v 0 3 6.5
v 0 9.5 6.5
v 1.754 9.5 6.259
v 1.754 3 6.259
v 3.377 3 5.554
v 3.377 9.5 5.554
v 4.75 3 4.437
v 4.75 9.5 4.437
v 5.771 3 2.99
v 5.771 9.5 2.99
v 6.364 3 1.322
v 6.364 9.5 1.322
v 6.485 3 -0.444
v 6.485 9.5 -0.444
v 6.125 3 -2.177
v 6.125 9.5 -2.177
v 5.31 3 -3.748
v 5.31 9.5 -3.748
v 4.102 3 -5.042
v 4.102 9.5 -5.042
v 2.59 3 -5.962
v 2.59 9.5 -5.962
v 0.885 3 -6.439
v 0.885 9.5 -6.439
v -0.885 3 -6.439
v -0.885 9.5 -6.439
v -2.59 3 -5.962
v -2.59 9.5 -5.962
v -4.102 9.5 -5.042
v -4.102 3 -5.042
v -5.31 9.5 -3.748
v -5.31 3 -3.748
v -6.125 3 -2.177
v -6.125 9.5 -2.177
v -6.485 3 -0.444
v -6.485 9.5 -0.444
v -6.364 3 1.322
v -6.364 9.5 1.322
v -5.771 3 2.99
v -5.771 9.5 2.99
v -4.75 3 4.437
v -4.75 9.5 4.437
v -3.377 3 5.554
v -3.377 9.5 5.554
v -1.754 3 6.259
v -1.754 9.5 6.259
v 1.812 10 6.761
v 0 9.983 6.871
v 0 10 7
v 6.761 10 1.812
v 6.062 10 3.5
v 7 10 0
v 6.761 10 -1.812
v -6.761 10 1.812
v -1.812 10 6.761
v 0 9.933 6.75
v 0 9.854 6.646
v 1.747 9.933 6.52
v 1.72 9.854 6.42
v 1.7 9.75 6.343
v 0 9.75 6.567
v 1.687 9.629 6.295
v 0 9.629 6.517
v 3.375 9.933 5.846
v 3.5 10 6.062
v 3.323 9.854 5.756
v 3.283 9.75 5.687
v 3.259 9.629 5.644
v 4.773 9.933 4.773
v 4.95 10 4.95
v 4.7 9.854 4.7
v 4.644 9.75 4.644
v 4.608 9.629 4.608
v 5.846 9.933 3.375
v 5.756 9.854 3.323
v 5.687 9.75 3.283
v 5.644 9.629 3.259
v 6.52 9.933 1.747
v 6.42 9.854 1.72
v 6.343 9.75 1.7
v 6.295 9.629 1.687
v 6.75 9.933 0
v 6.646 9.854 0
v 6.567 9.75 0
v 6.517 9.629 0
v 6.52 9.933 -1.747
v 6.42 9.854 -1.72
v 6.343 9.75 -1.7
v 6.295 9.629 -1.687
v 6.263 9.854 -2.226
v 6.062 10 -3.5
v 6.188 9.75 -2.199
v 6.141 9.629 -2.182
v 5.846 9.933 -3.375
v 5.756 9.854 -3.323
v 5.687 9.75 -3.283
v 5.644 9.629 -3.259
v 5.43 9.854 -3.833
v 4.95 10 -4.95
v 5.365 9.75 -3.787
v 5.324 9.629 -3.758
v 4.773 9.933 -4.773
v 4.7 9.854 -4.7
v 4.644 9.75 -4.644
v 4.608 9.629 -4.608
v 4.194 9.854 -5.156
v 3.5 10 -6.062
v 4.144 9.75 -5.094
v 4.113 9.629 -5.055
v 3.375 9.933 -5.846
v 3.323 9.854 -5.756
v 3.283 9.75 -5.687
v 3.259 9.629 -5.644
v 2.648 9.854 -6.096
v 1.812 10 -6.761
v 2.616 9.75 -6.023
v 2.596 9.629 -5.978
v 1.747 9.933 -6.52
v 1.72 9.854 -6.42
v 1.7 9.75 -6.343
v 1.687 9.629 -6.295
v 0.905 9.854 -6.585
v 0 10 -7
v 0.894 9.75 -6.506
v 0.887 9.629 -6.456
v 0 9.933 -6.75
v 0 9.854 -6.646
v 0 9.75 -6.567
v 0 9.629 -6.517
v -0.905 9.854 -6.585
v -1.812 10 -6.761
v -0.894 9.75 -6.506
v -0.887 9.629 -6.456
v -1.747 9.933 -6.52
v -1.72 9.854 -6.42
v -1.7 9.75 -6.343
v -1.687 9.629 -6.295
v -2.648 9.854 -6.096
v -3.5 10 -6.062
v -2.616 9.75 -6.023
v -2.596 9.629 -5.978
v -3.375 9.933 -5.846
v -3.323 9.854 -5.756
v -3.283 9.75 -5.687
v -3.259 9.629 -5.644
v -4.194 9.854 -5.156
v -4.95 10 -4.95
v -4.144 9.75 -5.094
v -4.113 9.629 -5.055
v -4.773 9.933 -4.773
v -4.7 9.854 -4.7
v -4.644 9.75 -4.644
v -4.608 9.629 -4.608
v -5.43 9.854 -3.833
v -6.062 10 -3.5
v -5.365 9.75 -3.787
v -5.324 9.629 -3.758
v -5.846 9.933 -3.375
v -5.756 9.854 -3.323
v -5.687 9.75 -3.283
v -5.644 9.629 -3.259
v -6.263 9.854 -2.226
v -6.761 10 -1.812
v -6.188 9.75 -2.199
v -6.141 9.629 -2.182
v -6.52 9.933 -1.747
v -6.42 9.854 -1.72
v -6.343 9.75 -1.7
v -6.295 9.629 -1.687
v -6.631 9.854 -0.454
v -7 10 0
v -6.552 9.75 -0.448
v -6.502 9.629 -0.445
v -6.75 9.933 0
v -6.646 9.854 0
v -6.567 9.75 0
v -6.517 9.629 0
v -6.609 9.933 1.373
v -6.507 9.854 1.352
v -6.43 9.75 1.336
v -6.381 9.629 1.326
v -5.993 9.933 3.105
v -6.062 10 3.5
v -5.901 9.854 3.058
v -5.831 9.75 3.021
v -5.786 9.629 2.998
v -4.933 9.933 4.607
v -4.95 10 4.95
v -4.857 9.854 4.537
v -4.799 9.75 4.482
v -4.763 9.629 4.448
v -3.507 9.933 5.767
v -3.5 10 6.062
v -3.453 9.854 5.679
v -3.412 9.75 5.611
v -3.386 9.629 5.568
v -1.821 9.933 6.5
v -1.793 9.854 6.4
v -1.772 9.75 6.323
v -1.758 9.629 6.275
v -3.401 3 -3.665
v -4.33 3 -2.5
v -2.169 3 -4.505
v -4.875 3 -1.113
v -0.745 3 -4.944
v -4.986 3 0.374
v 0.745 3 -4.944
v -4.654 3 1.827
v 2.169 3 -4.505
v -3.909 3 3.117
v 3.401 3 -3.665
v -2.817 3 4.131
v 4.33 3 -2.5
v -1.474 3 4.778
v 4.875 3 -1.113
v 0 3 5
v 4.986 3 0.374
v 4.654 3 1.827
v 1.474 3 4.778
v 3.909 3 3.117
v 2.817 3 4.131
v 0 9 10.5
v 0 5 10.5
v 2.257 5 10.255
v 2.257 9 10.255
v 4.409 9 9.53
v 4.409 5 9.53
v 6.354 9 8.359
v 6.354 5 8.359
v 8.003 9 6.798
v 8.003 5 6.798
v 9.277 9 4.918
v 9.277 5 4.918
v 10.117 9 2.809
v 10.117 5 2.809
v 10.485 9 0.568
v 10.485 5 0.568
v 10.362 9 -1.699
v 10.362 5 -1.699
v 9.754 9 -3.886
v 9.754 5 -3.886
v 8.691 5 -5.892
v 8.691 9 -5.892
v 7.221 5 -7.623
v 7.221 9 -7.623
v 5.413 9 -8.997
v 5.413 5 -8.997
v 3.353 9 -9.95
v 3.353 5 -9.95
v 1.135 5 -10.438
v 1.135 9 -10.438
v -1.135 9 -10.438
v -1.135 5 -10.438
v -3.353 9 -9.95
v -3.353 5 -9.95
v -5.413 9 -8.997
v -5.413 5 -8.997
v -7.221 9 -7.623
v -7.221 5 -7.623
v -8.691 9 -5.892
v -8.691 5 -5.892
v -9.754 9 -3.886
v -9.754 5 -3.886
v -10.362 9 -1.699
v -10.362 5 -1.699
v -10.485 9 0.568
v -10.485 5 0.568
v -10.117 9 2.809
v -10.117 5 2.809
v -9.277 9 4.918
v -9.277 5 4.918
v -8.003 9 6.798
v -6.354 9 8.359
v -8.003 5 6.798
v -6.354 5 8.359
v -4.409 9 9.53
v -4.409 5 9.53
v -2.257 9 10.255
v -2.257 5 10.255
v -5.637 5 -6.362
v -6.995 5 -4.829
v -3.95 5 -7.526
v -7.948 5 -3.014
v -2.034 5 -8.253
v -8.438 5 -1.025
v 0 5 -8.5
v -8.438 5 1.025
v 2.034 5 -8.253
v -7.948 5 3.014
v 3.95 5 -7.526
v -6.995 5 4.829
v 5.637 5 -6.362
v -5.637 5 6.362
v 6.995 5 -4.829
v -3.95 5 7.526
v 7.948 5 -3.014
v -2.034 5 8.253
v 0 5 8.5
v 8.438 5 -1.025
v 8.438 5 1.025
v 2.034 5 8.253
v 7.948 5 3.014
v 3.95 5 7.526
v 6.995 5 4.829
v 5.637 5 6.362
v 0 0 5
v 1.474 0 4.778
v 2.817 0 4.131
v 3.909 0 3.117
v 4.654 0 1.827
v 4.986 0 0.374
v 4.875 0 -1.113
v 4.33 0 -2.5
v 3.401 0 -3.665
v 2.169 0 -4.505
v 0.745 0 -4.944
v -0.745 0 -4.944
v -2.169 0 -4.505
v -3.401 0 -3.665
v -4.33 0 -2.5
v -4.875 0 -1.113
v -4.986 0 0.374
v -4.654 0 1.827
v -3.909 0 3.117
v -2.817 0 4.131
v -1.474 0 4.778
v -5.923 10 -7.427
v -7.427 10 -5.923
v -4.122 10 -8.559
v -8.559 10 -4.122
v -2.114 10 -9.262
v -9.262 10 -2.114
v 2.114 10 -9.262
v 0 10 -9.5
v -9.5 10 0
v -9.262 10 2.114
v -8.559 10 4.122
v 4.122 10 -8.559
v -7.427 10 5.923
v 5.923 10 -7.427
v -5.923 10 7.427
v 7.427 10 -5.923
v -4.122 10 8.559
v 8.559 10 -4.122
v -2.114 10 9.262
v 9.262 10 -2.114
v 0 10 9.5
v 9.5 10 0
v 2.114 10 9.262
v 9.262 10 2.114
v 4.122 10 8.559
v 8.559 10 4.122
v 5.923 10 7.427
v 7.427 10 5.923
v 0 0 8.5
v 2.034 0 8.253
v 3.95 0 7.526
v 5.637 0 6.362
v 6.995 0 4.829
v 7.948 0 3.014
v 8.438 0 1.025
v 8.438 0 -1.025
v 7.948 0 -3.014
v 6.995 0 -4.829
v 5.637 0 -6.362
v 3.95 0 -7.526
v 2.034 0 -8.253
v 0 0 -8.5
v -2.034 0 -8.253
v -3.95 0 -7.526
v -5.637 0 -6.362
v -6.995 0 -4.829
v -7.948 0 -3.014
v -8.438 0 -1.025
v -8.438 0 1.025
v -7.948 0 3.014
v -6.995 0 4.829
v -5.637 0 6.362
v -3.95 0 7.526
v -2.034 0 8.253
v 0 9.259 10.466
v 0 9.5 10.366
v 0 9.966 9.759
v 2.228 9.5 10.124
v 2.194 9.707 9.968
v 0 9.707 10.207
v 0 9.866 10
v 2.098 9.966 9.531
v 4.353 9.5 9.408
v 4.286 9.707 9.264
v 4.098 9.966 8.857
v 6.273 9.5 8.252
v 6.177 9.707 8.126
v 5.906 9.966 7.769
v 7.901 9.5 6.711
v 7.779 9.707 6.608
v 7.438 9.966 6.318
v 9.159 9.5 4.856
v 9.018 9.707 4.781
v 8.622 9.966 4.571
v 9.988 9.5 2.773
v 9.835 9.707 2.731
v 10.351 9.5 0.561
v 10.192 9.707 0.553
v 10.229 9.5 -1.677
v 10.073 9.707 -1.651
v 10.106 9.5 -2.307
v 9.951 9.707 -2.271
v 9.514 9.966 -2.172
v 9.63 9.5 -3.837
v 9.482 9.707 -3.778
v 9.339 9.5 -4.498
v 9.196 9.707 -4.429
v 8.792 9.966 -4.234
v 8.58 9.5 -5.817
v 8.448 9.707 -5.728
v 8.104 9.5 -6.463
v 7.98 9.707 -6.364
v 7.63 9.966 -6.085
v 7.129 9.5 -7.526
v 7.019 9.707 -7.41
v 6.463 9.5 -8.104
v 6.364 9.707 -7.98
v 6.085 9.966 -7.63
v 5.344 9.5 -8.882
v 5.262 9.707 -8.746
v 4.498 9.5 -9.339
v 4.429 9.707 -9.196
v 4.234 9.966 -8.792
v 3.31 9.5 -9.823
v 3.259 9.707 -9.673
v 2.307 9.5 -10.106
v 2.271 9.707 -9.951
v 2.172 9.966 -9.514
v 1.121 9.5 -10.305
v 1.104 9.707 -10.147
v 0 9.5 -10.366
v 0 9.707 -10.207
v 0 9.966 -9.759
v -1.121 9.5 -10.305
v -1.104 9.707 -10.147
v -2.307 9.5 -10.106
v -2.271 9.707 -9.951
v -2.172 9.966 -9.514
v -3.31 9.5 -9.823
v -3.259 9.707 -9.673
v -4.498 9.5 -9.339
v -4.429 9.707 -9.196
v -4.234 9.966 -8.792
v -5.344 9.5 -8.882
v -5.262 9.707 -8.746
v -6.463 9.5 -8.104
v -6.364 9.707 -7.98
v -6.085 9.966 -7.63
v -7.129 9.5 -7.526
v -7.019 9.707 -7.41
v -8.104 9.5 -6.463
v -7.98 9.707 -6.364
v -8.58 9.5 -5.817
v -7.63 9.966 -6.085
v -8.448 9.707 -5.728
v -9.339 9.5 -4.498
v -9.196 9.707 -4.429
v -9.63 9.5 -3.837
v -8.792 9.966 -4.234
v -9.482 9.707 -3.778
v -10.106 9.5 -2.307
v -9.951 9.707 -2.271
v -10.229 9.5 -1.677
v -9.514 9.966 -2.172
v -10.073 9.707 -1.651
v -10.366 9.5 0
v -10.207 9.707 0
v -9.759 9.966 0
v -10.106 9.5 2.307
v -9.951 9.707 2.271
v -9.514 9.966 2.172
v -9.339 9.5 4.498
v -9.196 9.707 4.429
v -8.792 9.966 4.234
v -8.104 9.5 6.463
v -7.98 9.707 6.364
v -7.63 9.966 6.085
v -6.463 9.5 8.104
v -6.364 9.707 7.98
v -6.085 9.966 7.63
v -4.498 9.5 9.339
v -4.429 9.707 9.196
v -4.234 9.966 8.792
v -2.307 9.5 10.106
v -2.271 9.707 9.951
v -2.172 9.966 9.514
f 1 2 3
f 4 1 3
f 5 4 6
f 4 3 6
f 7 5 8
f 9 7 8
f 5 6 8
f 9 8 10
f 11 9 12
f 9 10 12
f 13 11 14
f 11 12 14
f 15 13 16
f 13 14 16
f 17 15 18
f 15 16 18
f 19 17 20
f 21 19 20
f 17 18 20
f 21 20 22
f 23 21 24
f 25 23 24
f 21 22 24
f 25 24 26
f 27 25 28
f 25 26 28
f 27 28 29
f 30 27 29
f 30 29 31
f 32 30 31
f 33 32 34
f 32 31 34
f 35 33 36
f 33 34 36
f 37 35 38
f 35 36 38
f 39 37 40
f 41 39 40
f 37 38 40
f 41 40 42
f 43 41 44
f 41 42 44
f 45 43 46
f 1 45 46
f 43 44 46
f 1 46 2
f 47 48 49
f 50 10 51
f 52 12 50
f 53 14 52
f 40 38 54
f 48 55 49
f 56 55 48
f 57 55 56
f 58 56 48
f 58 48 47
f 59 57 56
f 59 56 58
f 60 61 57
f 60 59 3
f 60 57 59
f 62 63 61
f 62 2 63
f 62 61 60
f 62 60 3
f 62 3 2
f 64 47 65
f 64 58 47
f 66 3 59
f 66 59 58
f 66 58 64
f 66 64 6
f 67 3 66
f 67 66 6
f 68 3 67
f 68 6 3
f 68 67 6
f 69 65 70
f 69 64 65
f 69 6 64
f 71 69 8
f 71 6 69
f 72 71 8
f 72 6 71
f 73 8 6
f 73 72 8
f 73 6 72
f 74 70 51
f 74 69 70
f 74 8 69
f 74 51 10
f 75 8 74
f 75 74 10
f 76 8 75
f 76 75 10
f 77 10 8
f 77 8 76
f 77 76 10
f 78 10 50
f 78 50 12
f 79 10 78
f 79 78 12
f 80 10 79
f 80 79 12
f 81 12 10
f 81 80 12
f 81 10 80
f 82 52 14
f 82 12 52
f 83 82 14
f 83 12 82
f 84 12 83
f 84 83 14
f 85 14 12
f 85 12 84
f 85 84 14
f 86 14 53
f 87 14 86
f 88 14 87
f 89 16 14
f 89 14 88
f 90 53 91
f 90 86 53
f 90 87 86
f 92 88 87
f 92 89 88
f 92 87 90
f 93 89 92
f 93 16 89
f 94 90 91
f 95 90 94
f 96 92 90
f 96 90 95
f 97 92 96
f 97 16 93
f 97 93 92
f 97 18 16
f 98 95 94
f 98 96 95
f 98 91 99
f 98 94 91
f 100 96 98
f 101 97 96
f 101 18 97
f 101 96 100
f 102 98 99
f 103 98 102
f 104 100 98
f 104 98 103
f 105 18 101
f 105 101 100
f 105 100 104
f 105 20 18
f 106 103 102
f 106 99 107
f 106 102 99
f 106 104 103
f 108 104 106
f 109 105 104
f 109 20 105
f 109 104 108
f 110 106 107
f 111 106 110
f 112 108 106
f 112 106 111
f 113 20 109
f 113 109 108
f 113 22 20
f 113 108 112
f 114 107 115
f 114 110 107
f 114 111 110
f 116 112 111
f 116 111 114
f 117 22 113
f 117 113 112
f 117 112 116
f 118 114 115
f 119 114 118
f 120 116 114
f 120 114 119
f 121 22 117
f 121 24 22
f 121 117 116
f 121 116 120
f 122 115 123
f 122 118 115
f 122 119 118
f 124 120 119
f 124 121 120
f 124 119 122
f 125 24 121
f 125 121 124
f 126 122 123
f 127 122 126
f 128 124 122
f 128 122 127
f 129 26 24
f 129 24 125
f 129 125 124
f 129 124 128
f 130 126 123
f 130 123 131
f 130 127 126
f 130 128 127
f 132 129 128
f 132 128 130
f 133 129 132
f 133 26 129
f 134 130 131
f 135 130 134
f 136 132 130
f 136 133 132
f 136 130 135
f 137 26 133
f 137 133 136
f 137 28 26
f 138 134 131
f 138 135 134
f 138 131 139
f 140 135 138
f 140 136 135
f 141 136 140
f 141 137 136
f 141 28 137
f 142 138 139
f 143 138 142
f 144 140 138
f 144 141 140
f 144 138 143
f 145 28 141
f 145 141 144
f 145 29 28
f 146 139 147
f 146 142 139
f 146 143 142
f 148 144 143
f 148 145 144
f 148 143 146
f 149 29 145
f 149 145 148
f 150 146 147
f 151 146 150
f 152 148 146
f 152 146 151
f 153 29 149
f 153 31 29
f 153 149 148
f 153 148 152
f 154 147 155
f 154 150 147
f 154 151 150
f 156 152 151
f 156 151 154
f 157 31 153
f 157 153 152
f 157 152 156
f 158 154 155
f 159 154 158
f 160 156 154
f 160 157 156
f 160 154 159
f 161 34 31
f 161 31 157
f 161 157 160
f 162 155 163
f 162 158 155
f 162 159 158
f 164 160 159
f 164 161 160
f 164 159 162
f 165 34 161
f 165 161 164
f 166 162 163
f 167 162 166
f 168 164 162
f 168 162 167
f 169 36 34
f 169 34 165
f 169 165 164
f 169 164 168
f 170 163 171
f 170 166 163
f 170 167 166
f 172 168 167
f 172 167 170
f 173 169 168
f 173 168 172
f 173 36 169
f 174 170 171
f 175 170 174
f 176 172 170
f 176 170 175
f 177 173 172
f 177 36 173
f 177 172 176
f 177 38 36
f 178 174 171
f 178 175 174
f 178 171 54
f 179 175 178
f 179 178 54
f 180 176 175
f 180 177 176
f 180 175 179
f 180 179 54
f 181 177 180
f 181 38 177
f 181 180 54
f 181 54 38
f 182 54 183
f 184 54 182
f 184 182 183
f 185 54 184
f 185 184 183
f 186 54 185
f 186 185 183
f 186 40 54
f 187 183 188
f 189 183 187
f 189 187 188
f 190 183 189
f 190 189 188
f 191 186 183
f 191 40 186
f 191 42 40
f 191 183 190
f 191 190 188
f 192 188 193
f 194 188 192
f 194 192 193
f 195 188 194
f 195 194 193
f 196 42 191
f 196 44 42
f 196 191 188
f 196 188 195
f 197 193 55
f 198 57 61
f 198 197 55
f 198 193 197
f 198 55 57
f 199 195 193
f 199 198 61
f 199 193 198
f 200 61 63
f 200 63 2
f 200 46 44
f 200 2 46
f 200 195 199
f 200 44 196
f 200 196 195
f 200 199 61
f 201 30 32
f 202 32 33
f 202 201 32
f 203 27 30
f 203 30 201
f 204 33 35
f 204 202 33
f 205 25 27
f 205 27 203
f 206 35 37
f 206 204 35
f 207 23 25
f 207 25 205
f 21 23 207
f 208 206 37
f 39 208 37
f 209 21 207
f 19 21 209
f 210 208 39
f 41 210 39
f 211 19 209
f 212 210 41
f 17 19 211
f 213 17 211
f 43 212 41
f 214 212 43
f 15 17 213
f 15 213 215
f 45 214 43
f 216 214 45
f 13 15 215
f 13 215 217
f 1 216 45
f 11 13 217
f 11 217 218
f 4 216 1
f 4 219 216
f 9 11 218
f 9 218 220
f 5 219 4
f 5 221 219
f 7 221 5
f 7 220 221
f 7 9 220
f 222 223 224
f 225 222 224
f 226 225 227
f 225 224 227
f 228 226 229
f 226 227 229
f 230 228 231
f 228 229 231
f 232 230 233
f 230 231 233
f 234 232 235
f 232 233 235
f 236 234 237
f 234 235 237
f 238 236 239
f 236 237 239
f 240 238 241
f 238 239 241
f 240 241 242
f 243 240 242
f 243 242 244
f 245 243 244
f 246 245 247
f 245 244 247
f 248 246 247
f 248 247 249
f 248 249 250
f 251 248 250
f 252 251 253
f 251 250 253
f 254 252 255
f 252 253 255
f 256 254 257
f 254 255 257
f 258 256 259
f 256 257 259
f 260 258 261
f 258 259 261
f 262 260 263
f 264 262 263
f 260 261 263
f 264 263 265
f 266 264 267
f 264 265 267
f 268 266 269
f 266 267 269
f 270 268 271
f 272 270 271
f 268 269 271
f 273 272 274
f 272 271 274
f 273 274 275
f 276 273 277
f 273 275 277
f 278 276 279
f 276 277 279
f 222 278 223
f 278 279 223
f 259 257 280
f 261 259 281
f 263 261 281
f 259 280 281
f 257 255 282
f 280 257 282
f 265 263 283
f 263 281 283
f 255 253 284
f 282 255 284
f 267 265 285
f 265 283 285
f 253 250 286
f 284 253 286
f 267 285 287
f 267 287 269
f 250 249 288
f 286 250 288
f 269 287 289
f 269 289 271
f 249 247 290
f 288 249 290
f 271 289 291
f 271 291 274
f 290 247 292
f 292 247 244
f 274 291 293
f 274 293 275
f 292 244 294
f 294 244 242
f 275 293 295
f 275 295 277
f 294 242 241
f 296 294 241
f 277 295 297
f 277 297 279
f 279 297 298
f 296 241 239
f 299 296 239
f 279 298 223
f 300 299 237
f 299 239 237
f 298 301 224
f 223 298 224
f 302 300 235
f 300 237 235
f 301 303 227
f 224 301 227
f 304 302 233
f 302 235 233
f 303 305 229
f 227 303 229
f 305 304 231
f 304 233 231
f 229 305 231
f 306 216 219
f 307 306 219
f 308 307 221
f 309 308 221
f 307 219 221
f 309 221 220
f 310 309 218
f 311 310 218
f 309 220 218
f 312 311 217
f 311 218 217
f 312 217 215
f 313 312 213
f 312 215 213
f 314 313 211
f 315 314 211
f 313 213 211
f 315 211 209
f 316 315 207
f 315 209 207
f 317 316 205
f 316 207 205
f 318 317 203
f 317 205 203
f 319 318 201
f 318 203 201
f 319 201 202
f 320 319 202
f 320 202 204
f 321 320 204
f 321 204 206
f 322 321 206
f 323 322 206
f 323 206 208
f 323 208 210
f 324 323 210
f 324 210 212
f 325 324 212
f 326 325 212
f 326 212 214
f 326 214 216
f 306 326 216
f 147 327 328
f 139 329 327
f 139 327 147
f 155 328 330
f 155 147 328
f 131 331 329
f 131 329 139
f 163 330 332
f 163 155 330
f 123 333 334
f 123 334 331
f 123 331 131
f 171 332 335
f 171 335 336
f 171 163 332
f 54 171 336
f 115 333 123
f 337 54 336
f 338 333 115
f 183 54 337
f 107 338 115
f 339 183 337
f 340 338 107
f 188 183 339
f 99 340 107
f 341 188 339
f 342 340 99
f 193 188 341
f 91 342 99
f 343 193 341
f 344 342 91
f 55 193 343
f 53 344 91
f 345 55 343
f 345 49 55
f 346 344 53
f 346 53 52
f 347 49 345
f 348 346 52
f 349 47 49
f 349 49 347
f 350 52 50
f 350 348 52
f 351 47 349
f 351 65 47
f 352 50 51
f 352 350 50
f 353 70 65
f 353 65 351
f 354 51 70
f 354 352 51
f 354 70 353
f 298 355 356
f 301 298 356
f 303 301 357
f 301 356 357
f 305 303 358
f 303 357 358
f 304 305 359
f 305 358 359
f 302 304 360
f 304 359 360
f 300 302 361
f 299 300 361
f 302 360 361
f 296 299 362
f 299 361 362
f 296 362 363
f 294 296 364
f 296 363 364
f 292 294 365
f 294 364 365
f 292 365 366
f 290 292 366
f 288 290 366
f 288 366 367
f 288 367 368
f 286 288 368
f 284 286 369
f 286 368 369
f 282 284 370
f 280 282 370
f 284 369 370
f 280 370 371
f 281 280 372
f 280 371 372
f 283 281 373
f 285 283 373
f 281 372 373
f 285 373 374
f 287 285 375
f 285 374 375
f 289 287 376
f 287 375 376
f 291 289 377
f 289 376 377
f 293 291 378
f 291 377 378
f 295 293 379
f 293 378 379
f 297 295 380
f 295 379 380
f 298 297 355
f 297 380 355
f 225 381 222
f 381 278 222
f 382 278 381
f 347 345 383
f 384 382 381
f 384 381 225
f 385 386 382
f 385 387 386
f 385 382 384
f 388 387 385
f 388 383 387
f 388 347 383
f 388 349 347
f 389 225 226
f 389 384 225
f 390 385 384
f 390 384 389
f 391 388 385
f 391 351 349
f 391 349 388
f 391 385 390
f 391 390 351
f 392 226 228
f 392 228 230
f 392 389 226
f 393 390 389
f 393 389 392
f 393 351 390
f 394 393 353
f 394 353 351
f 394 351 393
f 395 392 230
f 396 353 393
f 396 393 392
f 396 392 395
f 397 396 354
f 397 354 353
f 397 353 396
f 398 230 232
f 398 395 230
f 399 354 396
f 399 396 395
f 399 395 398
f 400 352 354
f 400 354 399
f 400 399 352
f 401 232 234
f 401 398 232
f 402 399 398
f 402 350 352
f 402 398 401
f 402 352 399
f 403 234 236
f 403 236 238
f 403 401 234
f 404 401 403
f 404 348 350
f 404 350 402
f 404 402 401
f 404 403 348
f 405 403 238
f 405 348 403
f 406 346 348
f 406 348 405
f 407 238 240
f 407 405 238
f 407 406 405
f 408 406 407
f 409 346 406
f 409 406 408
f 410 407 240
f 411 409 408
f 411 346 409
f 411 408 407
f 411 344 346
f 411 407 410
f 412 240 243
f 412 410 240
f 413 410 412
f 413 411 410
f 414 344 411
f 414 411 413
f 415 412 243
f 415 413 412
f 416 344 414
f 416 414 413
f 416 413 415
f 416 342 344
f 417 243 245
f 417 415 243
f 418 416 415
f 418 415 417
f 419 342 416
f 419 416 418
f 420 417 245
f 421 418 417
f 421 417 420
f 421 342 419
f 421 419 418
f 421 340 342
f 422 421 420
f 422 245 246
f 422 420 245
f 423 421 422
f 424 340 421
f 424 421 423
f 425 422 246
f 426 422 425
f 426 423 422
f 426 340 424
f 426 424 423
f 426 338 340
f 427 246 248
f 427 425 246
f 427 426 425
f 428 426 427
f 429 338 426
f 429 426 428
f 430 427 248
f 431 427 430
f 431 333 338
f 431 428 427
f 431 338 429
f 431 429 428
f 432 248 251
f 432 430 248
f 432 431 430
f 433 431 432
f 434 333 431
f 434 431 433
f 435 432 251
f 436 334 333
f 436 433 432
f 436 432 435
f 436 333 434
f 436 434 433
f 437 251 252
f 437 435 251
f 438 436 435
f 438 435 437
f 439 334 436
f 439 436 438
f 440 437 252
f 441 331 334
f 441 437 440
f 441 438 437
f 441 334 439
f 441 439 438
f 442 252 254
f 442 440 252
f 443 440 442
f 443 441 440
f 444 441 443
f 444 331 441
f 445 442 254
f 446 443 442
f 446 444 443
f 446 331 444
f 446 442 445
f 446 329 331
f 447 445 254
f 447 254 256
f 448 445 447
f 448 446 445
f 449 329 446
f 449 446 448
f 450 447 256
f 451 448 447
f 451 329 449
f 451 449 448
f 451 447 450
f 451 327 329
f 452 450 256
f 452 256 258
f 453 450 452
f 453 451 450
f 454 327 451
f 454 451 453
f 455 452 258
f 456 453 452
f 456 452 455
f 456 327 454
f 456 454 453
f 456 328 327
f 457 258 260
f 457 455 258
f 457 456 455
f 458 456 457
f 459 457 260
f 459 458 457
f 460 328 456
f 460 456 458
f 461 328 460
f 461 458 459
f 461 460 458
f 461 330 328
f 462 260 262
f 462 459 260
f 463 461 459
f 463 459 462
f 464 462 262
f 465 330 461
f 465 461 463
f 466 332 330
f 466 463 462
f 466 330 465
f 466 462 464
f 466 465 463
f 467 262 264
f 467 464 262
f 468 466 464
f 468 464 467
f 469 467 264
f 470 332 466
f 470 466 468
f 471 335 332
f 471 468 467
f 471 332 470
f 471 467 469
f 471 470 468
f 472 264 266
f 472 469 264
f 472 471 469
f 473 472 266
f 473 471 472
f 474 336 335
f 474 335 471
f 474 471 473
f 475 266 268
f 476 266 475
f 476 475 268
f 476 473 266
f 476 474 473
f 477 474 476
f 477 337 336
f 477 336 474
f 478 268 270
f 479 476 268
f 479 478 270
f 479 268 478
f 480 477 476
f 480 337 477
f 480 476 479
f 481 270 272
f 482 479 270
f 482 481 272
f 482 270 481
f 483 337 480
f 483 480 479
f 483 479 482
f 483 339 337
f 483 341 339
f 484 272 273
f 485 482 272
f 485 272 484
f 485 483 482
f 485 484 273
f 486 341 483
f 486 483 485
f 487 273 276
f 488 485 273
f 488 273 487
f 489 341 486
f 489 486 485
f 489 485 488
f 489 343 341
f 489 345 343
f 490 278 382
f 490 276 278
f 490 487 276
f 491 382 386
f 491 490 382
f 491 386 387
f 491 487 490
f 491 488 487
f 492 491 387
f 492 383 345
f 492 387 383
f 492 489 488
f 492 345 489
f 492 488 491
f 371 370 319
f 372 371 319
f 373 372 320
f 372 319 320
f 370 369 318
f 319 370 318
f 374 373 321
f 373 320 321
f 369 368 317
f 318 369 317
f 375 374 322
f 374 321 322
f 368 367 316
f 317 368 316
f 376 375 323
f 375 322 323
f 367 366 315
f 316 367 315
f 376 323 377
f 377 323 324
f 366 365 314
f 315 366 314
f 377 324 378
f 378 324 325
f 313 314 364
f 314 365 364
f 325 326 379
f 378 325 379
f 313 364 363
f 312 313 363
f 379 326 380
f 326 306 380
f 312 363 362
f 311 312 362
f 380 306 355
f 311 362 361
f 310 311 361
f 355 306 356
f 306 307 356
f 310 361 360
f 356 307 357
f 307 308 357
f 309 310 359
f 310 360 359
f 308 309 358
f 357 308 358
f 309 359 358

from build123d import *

# Parameters (mm, degrees)
SKETCH1_R           = 8.5
BOSS_EXTRUDE1_DEPTH = 5
SKETCH2_R           = 10.5
BOSS_EXTRUDE2_DEPTH = 5
SKETCH3_R           = 5
CUT_EXTRUDE1_DEPTH  = 18.90251379
SKETCH4_R           = 6.5
CUT_EXTRUDE2_DEPTH  = 7
FILLET1_R           = 1
FILLET2_R           = 0.5


with BuildPart() as part:
    # Sketch1 → Boss-Extrude1 (new body)
    with BuildSketch(Plane(origin=(0, 0, 0), x_dir=(1, 0, 0), z_dir=(0, 1, 0))):
        with Locations(Location((0, 0, 0), (0, 0, 270))):
            Circle(SKETCH1_R)
    extrude(amount=BOSS_EXTRUDE1_DEPTH)

    # Sketch2 → Boss-Extrude2 (add)
    with BuildSketch(Plane(origin=(0, 5, 0), x_dir=(1, 0, 0), z_dir=(0, 1, 0))):
        with Locations(Location((0, 0, 0), (0, 0, 270))):
            Circle(SKETCH2_R)
    extrude(amount=BOSS_EXTRUDE2_DEPTH)

    # Sketch3 → Cut-Extrude1 (cut, through all)
    with BuildSketch(Plane(origin=(0, 10, 0), x_dir=(1, 0, 0), z_dir=(0, 1, 0))):
        with Locations(Location((0, 0, 0), (0, 0, 270))):
            Circle(SKETCH3_R)
    extrude(amount=-CUT_EXTRUDE1_DEPTH, mode=Mode.SUBTRACT)

    # Sketch4 → Cut-Extrude2 (cut)
    with BuildSketch(Plane(origin=(0, 10, 0), x_dir=(1, 0, 0), z_dir=(0, 1, 0))):
        with Locations(Location((0, 0, 0), (0, 0, 270))):
            Circle(SKETCH4_R)
    extrude(amount=-CUT_EXTRUDE2_DEPTH, mode=Mode.SUBTRACT)

    # Fillet1
    fillet1_edges = [part.edges().sort_by_distance(p)[0] for p in [
        (0, 10, -10.5),
    ]]
    fillet(fillet1_edges, radius=FILLET1_R)

    # Fillet2
    fillet2_edges = [part.edges().sort_by_distance(p)[0] for p in [
        (0, 10, -6.5),
    ]]
    fillet(fillet2_edges, radius=FILLET2_R)


solid = part.part
